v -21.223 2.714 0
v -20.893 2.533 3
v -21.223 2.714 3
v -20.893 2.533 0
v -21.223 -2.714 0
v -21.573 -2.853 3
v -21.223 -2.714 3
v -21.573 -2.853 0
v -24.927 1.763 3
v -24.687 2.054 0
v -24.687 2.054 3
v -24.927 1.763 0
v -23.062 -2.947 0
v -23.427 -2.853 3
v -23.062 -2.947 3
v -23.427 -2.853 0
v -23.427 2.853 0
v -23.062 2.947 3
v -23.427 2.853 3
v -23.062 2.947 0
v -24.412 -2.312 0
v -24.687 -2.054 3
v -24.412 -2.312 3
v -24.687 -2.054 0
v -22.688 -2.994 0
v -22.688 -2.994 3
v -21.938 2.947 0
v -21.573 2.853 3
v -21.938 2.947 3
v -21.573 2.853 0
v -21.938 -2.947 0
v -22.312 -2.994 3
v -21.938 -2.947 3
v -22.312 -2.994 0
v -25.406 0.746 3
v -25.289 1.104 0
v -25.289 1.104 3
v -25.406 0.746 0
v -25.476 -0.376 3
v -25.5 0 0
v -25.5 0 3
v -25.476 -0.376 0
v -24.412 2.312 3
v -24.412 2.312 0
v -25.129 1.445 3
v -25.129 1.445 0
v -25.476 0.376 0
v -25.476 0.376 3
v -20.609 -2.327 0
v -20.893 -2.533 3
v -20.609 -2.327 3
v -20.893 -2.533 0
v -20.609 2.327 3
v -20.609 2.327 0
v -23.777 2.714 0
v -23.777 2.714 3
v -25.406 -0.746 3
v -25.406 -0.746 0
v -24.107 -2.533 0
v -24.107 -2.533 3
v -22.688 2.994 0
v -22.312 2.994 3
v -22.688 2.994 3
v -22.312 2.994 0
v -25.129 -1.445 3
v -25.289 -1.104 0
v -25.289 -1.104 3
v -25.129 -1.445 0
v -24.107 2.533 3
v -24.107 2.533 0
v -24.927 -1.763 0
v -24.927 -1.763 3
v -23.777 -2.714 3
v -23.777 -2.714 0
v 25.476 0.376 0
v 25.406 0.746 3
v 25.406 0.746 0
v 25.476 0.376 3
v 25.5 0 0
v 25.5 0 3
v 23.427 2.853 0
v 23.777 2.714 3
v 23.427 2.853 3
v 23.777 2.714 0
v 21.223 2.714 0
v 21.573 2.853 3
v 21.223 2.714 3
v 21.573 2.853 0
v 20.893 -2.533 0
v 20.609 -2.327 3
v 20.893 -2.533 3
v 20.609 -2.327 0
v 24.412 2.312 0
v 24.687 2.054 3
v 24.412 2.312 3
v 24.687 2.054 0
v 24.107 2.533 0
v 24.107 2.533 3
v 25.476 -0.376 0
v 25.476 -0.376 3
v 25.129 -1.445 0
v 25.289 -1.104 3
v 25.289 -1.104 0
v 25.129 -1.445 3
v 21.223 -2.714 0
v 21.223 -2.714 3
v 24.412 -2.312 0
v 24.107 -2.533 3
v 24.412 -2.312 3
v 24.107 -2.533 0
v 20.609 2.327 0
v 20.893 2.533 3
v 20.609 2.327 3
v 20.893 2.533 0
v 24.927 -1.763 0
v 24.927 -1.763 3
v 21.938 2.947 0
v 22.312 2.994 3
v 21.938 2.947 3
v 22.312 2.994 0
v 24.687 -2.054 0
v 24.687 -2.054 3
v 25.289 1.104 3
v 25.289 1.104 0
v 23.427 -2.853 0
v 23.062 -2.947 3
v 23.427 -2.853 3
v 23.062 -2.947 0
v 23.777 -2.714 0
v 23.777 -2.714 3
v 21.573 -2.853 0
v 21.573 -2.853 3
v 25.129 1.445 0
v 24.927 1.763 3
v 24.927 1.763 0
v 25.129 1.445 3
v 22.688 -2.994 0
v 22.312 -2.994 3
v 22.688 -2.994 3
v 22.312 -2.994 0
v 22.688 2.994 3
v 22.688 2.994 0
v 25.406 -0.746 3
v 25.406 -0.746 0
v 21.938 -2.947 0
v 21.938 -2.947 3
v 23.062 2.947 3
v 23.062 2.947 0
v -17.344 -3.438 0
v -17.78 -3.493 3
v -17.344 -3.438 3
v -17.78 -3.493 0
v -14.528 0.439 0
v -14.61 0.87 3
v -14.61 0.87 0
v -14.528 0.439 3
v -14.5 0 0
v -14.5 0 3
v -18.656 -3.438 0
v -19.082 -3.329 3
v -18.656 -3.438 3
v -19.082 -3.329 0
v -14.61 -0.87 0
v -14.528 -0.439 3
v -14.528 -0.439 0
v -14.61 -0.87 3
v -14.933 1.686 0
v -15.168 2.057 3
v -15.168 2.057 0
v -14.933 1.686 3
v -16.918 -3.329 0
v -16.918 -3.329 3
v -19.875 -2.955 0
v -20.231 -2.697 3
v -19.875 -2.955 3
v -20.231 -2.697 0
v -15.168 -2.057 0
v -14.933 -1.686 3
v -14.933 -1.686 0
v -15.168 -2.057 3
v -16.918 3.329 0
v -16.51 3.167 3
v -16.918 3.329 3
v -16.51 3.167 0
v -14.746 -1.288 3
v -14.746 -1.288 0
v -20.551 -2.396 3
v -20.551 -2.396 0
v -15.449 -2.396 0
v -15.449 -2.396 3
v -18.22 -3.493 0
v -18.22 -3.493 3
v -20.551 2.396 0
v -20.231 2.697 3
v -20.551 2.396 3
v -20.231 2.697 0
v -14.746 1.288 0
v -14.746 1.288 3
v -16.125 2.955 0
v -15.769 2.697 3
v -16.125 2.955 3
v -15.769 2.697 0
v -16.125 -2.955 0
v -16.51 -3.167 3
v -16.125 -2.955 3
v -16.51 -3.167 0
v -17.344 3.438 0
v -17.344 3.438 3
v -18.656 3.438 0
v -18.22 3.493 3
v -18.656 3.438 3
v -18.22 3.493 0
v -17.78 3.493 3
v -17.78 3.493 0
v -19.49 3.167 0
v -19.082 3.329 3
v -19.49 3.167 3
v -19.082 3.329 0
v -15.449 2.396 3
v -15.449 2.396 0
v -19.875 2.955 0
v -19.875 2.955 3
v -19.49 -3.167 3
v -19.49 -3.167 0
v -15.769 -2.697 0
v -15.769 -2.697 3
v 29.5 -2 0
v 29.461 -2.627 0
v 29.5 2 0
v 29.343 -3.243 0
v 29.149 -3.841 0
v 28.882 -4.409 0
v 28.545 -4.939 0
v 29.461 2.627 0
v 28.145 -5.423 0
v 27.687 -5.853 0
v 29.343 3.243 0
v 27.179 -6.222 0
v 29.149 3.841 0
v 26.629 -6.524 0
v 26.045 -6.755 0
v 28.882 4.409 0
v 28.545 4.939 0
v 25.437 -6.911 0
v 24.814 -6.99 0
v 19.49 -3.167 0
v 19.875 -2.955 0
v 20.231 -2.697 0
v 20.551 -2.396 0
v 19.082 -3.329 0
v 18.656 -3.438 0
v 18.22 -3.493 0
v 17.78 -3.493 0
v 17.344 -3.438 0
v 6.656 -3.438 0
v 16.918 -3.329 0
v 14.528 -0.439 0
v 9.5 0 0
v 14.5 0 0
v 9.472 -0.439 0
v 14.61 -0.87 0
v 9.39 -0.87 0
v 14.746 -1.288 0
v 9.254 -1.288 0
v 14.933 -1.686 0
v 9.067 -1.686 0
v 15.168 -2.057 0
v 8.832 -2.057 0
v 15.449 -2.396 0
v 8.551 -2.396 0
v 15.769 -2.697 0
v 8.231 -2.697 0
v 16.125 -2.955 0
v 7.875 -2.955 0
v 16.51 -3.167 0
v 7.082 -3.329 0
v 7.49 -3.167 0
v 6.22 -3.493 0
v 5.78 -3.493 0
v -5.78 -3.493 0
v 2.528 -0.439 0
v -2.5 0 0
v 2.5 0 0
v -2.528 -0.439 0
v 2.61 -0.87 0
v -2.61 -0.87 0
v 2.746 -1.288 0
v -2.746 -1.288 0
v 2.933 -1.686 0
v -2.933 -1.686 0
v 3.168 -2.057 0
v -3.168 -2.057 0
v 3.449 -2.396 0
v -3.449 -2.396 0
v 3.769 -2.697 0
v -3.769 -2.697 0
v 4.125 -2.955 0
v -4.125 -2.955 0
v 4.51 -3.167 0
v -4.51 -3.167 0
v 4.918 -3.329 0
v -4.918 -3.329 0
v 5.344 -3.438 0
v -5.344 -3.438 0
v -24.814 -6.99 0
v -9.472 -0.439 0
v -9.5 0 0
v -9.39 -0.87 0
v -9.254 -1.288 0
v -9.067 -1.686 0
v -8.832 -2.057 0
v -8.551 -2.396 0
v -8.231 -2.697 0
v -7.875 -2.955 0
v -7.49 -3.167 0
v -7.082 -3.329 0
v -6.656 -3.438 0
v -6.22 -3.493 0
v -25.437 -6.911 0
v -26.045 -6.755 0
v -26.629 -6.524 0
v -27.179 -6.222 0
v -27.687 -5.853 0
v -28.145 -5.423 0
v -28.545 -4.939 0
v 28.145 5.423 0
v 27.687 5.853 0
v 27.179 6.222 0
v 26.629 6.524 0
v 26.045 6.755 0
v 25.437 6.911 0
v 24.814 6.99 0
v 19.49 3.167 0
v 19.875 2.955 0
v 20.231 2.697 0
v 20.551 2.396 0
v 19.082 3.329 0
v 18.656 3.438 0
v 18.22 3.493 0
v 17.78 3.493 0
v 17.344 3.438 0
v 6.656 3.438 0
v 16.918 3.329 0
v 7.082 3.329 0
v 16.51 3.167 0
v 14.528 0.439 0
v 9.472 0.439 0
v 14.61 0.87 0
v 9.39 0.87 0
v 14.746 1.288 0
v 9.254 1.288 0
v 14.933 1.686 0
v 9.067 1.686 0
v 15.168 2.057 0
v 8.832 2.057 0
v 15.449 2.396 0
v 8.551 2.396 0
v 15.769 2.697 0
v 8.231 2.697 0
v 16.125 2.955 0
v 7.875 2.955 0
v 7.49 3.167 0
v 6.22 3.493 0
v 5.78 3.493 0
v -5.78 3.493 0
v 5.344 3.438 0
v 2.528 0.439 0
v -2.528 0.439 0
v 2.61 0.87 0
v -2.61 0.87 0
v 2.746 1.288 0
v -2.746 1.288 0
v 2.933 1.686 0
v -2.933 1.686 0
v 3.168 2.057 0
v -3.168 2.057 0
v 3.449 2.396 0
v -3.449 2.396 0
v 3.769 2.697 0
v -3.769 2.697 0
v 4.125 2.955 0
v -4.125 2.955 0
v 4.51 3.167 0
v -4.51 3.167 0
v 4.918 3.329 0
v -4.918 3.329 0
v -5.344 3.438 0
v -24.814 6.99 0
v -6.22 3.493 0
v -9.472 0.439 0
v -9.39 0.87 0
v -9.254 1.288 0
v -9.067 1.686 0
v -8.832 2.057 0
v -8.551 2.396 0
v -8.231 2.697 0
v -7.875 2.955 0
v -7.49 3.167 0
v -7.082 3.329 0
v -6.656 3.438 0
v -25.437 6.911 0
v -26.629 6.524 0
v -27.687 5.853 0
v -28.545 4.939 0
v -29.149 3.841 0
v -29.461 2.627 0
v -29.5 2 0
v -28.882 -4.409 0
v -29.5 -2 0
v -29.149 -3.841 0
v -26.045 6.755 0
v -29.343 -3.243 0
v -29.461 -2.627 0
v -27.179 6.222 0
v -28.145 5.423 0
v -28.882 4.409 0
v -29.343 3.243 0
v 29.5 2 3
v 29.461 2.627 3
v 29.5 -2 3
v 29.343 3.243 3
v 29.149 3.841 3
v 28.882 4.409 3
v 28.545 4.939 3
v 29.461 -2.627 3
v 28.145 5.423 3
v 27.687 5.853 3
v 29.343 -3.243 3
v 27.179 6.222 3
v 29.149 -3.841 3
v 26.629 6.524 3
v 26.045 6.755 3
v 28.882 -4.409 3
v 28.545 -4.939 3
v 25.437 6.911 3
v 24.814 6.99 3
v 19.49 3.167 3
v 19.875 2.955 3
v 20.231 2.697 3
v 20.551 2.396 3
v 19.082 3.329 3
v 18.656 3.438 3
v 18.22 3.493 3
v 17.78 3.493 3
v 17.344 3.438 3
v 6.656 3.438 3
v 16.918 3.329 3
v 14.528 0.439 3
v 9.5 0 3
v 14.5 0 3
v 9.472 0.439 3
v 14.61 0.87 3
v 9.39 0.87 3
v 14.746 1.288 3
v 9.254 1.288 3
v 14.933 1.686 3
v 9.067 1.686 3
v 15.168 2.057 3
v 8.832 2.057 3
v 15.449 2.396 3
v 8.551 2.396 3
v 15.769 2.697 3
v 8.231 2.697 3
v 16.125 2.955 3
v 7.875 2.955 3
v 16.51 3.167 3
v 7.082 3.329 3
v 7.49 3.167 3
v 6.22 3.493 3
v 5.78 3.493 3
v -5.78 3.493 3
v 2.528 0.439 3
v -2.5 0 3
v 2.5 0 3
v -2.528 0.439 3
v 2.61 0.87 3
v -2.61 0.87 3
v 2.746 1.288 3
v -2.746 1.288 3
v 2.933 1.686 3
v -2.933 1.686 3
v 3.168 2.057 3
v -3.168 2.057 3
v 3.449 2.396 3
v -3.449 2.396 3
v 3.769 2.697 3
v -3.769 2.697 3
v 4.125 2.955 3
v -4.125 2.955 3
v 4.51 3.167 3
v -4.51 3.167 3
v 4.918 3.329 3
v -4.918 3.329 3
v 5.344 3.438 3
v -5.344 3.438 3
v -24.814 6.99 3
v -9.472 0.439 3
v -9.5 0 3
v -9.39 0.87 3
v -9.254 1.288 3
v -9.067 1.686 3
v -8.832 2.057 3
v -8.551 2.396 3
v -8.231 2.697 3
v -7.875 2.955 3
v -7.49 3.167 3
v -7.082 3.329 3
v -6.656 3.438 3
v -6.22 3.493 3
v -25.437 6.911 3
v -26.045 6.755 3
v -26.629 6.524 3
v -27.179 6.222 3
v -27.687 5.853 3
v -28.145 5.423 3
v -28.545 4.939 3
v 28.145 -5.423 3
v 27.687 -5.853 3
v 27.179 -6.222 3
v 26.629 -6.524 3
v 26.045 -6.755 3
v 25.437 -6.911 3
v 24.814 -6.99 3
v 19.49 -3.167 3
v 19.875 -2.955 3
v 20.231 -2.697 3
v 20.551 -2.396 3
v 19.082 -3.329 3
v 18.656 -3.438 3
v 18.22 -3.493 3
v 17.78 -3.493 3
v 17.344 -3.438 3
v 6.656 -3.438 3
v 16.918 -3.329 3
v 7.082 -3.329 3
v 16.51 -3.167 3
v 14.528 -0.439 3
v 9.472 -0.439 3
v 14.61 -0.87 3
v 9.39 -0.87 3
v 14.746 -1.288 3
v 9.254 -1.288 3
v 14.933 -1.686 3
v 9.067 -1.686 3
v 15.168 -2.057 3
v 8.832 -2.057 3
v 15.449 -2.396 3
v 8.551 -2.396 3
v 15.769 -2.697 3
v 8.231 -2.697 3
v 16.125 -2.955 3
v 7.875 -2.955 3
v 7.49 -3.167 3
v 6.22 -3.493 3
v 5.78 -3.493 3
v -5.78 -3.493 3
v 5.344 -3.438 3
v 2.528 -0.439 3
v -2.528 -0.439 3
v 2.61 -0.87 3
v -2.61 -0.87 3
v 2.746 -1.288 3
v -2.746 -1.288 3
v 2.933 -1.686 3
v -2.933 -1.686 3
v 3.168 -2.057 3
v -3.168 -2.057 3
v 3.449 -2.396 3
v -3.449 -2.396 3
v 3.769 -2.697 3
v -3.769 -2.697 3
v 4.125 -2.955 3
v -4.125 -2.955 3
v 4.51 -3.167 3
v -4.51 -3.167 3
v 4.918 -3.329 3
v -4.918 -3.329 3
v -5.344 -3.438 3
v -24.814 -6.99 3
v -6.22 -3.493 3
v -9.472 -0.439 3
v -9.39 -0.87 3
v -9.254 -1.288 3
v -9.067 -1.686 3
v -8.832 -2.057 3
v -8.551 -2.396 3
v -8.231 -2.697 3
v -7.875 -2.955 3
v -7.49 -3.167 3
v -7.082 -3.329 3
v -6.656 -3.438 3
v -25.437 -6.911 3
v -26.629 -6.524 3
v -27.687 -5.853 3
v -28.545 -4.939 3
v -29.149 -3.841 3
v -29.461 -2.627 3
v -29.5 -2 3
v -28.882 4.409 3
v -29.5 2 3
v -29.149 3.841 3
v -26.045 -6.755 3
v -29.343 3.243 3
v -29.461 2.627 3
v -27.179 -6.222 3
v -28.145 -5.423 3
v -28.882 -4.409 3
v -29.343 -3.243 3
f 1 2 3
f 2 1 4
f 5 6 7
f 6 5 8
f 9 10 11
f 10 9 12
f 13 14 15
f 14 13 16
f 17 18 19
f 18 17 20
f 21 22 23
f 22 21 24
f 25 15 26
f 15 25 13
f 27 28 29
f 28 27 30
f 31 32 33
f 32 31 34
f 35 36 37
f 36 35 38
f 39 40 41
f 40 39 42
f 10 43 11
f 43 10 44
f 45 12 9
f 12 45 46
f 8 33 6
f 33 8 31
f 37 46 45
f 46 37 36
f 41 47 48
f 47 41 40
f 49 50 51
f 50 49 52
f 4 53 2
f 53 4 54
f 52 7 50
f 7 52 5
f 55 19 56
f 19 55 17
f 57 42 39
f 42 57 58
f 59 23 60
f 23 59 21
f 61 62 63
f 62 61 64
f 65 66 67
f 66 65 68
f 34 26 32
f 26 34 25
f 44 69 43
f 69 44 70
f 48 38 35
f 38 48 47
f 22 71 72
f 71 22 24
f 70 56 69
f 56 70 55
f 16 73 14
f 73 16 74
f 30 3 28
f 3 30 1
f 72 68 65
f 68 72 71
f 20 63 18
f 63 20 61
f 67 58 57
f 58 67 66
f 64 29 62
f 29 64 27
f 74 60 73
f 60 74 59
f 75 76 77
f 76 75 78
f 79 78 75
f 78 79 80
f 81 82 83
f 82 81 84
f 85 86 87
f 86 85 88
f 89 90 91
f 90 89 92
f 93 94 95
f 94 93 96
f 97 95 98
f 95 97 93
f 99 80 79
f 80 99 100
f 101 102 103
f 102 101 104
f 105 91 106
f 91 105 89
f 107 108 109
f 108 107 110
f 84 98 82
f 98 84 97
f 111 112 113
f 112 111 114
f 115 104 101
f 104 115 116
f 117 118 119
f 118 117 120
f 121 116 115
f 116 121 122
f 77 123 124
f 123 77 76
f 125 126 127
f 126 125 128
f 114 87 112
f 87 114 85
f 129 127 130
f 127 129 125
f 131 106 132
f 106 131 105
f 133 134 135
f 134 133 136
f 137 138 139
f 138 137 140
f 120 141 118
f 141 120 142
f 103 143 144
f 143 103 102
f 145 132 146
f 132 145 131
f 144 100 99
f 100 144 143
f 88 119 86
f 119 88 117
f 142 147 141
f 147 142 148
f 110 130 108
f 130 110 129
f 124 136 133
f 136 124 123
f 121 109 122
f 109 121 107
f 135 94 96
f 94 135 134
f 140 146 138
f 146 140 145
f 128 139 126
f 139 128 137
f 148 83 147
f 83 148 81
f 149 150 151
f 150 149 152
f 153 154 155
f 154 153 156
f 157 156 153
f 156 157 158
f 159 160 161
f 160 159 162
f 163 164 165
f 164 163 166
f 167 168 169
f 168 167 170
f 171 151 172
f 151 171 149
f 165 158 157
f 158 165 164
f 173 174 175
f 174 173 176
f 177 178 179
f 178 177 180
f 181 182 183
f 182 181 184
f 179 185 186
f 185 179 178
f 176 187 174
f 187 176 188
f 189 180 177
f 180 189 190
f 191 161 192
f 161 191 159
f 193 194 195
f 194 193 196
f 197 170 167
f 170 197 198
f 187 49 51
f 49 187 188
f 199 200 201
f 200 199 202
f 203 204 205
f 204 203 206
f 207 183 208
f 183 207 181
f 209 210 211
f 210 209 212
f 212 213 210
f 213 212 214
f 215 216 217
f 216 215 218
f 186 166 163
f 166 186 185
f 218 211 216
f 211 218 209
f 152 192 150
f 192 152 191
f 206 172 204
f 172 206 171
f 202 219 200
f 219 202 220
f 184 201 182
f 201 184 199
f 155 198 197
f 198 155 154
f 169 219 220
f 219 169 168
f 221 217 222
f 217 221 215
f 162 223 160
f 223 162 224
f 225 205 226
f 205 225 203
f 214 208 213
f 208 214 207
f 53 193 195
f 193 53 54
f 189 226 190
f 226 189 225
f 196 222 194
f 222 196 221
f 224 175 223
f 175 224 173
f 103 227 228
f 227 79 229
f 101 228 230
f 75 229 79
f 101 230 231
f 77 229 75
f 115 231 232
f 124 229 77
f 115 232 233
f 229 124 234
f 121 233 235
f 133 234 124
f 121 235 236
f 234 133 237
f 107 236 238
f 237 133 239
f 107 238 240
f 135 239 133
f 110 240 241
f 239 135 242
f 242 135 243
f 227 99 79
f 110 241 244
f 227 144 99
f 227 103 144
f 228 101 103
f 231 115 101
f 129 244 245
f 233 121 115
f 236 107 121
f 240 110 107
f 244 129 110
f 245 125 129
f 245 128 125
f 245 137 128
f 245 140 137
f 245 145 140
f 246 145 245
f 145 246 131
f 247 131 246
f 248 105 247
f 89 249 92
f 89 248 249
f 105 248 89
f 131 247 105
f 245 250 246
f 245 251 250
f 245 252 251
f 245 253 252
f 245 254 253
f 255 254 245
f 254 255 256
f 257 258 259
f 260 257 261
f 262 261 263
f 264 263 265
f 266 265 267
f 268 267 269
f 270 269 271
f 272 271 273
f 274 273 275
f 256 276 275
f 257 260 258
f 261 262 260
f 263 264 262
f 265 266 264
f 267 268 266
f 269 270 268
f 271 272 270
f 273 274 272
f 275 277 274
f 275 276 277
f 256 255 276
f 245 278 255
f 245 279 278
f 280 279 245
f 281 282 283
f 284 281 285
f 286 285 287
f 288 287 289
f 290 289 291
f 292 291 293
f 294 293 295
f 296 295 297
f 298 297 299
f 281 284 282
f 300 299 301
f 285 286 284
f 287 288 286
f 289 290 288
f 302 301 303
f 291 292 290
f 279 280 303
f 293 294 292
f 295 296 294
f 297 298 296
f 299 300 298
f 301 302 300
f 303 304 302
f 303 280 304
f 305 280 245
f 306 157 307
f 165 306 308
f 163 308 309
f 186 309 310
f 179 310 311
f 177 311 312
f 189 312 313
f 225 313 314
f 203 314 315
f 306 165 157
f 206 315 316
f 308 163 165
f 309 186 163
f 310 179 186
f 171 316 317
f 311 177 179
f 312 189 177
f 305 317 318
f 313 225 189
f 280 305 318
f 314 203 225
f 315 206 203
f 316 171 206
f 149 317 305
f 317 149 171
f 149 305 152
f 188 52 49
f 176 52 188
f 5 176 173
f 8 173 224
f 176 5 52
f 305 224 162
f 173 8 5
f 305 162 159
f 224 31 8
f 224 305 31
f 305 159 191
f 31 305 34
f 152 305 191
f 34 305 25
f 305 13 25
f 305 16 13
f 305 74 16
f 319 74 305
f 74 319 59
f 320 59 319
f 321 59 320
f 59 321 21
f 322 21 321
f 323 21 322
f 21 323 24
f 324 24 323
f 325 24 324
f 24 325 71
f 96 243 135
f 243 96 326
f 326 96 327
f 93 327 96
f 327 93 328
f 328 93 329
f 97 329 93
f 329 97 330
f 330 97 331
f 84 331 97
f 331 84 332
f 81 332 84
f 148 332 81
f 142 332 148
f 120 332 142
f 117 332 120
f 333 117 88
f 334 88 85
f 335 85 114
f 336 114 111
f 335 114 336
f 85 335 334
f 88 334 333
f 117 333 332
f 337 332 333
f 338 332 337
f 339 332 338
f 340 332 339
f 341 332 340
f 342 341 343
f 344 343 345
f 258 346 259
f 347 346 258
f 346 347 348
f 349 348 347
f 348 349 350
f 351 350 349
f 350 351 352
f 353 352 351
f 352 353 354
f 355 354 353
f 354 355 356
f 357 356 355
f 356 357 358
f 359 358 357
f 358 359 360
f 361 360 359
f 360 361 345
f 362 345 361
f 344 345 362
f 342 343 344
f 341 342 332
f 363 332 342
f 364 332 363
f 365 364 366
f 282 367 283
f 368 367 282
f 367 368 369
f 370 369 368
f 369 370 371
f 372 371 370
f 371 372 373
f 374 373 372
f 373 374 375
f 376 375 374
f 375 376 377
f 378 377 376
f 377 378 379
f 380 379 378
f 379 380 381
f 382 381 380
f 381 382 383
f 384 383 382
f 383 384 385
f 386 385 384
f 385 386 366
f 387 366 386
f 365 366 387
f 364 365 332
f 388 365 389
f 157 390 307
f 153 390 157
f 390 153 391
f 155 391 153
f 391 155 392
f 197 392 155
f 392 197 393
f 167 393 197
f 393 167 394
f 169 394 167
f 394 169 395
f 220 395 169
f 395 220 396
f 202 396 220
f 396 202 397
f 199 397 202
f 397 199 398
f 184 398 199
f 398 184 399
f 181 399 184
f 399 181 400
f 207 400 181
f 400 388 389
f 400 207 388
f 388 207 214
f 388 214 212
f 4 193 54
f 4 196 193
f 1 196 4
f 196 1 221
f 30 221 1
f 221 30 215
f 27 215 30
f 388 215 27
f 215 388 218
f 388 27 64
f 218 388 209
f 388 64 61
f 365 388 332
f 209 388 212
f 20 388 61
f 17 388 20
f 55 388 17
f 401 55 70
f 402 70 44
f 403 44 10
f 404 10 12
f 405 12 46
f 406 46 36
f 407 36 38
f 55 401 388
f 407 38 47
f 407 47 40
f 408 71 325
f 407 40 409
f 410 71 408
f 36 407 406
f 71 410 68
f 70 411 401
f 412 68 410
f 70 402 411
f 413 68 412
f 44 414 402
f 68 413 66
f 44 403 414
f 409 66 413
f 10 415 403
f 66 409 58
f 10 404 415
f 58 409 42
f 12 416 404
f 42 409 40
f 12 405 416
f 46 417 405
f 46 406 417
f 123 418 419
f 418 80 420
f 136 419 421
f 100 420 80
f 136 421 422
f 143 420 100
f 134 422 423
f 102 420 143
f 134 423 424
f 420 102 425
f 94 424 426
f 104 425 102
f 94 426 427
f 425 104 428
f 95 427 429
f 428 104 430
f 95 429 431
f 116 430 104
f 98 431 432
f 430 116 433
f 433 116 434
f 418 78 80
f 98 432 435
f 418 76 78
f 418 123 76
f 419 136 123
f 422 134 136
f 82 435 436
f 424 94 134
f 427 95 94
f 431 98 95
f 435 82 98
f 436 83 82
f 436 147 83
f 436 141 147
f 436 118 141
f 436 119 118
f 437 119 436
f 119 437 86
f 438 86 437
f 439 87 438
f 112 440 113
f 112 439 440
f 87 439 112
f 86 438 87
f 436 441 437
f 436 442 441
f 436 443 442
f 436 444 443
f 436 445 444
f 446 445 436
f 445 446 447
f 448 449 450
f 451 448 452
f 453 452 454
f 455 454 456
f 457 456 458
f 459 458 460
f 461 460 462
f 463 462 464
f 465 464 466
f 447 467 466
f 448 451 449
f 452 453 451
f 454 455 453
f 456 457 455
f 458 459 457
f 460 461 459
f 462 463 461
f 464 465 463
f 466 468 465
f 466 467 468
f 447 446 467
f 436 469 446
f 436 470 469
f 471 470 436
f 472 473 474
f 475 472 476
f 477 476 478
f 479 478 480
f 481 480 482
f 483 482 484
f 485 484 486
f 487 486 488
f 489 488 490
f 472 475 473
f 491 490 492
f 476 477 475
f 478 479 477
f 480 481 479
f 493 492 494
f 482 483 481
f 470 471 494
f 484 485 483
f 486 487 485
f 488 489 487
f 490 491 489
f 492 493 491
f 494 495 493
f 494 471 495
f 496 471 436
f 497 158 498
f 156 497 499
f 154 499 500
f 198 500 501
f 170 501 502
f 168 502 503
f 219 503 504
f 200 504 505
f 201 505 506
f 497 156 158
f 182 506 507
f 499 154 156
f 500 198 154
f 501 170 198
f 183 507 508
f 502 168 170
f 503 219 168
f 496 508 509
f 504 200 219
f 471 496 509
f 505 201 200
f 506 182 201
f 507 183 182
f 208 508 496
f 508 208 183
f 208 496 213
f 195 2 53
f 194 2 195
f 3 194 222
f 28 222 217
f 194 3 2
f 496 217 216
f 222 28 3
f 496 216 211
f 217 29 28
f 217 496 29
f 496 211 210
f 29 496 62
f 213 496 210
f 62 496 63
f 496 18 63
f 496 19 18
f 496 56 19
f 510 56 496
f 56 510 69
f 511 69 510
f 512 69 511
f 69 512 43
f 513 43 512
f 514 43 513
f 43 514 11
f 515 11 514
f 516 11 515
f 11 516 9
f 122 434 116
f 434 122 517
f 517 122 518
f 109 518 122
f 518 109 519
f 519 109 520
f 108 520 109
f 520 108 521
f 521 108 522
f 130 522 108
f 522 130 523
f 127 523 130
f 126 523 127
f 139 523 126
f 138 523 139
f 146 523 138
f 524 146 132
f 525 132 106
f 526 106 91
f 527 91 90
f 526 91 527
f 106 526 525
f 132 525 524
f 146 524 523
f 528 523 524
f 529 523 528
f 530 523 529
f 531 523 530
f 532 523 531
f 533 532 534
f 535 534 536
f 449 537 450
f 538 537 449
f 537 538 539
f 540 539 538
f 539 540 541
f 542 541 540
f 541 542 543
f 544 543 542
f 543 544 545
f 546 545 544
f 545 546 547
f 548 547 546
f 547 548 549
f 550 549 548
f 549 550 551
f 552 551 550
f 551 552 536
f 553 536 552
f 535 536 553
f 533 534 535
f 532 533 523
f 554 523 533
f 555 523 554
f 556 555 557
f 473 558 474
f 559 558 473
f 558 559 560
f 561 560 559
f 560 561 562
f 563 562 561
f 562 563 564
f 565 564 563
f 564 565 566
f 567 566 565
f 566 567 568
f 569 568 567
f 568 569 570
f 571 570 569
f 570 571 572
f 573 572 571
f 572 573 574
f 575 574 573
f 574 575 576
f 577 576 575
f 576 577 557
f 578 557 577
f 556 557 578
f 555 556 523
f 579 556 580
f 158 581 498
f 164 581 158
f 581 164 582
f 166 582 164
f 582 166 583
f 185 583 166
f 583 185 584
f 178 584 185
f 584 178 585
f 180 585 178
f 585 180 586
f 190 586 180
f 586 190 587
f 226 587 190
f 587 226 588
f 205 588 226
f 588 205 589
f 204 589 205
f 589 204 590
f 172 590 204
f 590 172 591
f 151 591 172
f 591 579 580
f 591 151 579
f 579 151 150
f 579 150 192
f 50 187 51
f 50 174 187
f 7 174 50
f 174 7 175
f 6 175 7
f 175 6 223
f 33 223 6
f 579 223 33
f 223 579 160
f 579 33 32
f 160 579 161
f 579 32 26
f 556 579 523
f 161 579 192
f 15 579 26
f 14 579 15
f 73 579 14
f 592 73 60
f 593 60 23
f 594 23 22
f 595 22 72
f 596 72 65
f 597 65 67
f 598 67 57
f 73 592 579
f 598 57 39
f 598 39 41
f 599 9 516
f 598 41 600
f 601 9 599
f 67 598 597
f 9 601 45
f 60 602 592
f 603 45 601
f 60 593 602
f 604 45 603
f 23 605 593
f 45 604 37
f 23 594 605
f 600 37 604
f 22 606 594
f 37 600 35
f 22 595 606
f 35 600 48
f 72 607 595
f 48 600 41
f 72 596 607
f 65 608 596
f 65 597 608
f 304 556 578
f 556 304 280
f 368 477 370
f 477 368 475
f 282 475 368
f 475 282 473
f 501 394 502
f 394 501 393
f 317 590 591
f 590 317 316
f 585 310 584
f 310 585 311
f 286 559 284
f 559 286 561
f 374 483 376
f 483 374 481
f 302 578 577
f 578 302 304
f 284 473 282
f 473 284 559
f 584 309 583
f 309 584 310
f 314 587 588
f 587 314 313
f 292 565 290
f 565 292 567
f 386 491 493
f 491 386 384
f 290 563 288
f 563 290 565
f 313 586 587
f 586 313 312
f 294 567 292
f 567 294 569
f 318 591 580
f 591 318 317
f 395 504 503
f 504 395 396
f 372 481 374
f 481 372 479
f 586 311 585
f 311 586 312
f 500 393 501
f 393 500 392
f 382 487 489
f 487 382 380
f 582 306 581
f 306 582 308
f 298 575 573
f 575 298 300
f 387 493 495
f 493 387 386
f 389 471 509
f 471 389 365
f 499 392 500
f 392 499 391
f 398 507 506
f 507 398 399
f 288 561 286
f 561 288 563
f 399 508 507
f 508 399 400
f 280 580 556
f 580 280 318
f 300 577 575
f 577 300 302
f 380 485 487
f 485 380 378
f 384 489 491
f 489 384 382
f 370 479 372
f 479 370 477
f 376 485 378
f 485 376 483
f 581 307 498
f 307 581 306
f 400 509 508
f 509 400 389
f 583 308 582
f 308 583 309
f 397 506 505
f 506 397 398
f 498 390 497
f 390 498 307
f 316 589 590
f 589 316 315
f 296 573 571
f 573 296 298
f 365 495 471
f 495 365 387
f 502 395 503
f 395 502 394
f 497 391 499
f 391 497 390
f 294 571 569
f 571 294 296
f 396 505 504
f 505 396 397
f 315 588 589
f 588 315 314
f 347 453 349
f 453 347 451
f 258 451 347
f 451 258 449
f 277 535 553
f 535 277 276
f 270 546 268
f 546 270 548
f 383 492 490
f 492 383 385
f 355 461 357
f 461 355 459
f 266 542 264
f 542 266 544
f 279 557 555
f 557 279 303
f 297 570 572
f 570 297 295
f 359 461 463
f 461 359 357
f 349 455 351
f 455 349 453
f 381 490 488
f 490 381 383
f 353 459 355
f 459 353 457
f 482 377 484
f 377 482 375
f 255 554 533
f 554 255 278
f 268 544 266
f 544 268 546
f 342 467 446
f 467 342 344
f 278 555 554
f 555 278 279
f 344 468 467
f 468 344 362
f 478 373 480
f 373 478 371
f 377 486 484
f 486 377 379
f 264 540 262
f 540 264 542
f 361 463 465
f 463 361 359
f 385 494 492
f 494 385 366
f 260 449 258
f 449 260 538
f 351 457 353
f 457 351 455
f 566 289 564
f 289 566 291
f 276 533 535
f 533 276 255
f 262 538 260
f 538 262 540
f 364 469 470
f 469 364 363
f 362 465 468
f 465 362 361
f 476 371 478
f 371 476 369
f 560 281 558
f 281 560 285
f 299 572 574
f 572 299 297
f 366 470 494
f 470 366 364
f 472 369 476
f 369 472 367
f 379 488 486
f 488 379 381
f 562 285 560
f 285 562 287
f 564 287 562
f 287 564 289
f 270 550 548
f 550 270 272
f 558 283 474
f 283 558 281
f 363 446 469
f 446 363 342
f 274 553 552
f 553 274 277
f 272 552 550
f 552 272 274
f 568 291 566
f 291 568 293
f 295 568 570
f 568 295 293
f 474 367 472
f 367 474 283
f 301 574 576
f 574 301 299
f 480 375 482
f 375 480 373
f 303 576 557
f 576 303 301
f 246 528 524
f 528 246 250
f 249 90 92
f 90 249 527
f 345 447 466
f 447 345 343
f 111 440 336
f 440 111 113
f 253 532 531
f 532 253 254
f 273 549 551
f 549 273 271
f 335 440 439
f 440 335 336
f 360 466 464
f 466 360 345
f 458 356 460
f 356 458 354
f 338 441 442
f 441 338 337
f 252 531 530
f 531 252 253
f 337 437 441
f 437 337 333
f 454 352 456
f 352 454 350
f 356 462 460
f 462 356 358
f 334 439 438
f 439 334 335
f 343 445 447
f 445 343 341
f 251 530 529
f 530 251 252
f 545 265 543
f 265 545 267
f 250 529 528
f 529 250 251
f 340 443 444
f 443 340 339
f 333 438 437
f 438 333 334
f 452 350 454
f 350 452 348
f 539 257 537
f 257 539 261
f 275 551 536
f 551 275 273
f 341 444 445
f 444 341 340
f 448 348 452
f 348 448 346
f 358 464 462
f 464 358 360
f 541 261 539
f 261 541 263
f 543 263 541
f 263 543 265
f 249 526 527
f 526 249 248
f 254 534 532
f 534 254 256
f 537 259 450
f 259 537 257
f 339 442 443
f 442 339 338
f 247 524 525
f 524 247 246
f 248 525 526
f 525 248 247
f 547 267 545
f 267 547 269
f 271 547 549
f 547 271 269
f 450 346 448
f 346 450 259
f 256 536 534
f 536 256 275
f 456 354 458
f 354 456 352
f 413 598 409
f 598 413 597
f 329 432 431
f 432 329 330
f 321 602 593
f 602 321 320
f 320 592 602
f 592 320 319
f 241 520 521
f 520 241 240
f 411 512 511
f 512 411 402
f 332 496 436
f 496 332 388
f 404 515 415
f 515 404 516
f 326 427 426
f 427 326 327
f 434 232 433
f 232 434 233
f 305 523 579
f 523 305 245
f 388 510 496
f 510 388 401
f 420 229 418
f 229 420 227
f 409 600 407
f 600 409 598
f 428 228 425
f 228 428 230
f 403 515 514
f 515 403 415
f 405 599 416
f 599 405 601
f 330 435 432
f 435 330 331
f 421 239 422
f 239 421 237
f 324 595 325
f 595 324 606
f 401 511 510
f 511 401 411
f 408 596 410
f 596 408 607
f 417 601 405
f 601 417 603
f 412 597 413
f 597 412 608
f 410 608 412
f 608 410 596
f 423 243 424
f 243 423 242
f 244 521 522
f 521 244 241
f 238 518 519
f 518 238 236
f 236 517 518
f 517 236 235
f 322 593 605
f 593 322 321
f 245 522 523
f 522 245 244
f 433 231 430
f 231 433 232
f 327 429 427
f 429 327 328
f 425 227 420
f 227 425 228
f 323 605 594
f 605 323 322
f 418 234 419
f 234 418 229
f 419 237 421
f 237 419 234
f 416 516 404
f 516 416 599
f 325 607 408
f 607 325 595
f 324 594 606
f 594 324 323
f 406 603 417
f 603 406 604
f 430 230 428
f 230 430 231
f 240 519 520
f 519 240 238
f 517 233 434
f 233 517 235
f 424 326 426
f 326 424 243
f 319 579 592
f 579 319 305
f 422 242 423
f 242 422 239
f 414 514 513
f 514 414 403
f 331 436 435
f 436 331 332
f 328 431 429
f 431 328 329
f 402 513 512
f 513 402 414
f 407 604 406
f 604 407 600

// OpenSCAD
$fn = 50;


difference() {
	union() {
		hull() {
			translate(v = [-24.5000000000, 2.0000000000, 0]) {
				cylinder(h = 3, r = 5);
			}
			translate(v = [24.5000000000, 2.0000000000, 0]) {
				cylinder(h = 3, r = 5);
			}
			translate(v = [-24.5000000000, -2.0000000000, 0]) {
				cylinder(h = 3, r = 5);
			}
			translate(v = [24.5000000000, -2.0000000000, 0]) {
				cylinder(h = 3, r = 5);
			}
		}
	}
	union() {
		#translate(v = [-22.5000000000, 0.0000000000, -100.0000000000]) {
			cylinder(h = 200, r = 3.0000000000);
		}
		#translate(v = [-22.5000000000, 0.0000000000, -100.0000000000]) {
			cylinder(h = 200, r = 3.0000000000);
		}
		#translate(v = [22.5000000000, 0.0000000000, -100.0000000000]) {
			cylinder(h = 200, r = 3.0000000000);
		}
		#translate(v = [22.5000000000, 0.0000000000, -100.0000000000]) {
			cylinder(h = 200, r = 3.0000000000);
		}
		#translate(v = [-18.0000000000, 0, 0]) {
			cylinder(h = 3, r = 3.5000000000);
		}
		#translate(v = [-6.0000000000, 0, 0]) {
			cylinder(h = 3, r = 3.5000000000);
		}
		#translate(v = [6.0000000000, 0, 0]) {
			cylinder(h = 3, r = 3.5000000000);
		}
		#translate(v = [18.0000000000, 0, 0]) {
			cylinder(h = 3, r = 3.5000000000);
		}
	}
}
